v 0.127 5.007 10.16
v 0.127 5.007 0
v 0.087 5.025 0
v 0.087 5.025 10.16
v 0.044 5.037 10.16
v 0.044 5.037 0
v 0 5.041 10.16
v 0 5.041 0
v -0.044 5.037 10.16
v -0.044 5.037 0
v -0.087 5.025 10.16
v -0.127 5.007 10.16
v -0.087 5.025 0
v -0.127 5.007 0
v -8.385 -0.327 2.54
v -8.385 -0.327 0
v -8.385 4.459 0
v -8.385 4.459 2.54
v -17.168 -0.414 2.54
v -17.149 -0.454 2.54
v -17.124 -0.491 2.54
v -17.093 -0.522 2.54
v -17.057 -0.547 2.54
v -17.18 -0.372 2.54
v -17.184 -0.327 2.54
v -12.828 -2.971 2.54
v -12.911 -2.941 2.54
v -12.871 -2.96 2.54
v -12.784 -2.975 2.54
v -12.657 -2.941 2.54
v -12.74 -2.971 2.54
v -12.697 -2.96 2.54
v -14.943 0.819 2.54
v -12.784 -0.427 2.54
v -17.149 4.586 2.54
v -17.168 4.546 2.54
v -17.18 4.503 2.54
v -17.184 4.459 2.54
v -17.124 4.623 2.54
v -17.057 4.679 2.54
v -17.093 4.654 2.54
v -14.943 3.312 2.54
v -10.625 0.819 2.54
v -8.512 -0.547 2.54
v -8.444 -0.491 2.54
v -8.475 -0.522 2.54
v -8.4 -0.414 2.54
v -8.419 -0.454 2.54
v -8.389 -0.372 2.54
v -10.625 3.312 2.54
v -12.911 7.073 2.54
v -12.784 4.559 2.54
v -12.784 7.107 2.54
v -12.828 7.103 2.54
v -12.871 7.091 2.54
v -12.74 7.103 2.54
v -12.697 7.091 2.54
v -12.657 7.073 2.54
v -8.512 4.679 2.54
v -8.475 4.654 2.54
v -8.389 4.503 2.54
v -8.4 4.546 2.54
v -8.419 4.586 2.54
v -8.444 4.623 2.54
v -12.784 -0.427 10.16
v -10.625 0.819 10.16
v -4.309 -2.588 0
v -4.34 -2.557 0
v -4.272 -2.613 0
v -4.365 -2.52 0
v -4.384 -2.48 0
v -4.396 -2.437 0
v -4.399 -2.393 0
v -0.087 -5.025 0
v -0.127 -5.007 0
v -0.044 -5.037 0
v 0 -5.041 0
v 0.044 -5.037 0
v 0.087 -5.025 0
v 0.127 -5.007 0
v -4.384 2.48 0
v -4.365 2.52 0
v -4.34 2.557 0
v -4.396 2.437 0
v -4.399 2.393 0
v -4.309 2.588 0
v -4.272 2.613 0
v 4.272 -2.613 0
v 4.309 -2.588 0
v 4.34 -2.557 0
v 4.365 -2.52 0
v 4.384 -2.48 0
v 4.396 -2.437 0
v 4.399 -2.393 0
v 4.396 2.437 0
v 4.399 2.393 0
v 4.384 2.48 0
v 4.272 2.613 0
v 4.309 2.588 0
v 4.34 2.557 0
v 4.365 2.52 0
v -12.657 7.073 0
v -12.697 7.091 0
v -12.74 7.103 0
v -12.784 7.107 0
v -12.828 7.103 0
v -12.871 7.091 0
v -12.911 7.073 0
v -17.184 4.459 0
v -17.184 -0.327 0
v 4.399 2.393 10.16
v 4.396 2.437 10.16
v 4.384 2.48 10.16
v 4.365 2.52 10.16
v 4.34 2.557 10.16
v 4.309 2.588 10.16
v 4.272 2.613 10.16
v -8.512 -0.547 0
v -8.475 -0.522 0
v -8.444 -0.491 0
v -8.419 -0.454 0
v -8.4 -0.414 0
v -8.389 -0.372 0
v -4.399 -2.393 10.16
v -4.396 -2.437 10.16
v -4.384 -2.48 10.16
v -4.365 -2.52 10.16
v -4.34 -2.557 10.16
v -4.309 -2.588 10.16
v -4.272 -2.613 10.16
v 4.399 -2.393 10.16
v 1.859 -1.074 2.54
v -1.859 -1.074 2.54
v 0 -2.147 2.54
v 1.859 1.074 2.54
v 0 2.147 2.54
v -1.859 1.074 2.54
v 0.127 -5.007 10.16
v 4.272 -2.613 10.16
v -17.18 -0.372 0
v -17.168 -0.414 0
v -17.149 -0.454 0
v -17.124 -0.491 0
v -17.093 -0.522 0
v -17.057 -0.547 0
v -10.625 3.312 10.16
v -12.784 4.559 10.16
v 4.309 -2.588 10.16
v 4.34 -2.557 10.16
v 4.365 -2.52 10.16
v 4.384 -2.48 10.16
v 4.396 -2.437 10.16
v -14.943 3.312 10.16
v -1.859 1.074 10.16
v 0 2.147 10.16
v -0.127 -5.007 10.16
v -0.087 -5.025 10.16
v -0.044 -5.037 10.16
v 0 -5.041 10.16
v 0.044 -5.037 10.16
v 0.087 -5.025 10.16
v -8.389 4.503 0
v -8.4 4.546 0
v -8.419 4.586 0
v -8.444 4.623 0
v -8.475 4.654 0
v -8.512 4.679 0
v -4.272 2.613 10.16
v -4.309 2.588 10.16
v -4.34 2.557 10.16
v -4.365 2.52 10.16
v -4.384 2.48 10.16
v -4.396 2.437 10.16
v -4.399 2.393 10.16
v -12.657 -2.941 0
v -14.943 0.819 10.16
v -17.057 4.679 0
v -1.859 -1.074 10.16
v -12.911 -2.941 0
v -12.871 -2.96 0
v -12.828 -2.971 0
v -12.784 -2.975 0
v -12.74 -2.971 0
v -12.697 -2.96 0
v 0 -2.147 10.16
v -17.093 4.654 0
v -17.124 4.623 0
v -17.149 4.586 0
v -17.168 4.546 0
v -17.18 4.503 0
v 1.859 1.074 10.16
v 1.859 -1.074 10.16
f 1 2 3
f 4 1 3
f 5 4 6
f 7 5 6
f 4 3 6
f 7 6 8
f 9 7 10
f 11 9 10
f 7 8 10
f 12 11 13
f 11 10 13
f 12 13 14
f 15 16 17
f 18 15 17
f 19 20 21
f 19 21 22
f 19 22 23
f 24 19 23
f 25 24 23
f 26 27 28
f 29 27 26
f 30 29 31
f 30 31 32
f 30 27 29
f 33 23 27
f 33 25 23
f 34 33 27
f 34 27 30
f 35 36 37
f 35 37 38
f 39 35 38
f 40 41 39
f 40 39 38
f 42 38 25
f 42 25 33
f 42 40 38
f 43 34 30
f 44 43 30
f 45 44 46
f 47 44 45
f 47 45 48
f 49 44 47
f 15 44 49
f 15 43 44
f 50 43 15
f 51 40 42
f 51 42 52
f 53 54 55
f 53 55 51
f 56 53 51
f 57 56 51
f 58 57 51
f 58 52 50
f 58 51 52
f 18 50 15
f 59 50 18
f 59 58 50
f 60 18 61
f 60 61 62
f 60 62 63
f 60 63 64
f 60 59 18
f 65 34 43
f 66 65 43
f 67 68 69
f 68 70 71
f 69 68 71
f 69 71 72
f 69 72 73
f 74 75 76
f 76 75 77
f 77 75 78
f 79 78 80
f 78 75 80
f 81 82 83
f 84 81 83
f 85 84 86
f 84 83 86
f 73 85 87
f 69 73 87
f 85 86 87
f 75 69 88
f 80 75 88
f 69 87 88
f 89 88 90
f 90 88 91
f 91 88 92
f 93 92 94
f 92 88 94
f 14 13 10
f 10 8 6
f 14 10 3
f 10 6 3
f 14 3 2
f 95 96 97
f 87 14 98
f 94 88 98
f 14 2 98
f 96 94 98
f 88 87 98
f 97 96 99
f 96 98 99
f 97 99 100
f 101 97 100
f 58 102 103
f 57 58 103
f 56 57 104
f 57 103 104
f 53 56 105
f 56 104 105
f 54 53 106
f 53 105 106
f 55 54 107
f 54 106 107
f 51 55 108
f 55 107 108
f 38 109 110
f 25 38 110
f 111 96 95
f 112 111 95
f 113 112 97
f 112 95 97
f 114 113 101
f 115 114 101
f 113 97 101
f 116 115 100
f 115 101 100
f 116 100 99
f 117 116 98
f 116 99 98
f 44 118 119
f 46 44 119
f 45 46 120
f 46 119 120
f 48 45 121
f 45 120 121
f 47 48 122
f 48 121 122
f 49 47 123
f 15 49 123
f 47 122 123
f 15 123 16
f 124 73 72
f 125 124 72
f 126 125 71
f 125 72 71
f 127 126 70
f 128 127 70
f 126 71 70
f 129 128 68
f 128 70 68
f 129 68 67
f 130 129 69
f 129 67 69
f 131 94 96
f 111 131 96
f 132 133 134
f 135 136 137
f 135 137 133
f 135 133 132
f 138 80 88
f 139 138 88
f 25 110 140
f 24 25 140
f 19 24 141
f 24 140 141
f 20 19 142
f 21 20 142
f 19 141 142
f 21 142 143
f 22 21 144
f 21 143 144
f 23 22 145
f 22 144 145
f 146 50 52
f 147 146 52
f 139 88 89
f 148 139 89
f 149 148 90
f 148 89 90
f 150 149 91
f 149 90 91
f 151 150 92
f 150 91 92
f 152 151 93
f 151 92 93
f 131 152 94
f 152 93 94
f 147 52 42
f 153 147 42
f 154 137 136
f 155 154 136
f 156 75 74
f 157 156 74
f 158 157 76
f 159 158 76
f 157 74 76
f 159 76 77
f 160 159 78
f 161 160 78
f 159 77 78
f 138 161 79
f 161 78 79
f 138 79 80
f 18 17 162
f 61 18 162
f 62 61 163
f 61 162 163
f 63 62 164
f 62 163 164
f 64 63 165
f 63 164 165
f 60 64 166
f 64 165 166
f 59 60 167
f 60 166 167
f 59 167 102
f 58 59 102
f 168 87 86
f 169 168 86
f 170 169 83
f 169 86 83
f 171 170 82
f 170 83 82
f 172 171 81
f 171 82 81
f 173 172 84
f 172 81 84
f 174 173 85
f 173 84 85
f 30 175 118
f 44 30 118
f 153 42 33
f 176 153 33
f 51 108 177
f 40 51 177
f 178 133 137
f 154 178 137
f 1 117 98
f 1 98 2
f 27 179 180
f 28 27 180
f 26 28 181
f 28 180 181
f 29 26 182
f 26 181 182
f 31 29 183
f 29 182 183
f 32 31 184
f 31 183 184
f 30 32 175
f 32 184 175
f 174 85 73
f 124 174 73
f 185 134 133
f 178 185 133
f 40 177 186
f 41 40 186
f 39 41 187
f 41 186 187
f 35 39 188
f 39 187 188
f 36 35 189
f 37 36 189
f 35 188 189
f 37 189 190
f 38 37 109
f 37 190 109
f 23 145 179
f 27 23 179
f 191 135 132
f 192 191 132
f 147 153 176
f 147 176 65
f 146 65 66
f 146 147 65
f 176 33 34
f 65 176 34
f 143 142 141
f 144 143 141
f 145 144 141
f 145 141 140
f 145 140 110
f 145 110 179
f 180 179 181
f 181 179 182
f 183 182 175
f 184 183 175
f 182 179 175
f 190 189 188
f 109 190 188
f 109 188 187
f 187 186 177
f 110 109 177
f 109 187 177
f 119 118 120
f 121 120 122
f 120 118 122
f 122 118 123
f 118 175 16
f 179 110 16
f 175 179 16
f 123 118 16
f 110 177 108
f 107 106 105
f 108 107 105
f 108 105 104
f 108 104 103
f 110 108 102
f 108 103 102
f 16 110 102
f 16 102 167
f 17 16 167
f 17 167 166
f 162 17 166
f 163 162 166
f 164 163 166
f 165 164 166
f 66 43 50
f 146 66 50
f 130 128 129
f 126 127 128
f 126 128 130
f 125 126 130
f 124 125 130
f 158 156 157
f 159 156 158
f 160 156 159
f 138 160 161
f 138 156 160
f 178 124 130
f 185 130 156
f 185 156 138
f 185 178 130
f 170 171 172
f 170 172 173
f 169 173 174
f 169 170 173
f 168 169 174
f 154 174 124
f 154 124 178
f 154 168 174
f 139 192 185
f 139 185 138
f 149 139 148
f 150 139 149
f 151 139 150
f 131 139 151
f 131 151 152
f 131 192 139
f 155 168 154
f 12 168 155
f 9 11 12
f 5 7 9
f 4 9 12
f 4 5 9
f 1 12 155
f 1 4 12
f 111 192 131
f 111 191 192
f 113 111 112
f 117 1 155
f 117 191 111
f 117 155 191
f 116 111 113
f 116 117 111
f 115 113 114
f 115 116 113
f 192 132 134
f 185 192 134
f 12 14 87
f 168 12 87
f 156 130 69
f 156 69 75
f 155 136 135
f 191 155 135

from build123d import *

# Parameters (mm, degrees)
F1_DEPTH = 10.16
F2_DEPTH = 2.54
F3_DEPTH = 10.16
F4_DEPTH = 2.54


with BuildPart() as f1:
    # F0 (on Top) → F1 (new body)
    with BuildSketch(Plane.XY):
        Polygon((-10.625117, 0.819381), (-10.625117, 3.31238), (-12.784117, 4.558879), (-14.943117, 3.31238), (-14.943117, 0.819381), (-12.784117, -0.427118), align=None)
    extrude(amount=F1_DEPTH)

    # F0 (on Top) → F2 (join)
    with BuildSketch(Plane.XY):
        with BuildLine():
            Line((-12.911117, 7.072557), (-17.056526, 4.679204))
            ThreePointArc((-17.056526, 4.679204), (-17.149497, 4.586234), (-17.183526, 4.459234))
            Line((-17.183526, 4.459234), (-17.183526, -0.327472))
            ThreePointArc((-17.183526, -0.327472), (-17.149497, -0.454472), (-17.056526, -0.547443))
            Line((-17.056526, -0.547443), (-12.911117, -2.940796))
            ThreePointArc((-12.911117, -2.940796), (-12.784117, -2.974825), (-12.657117, -2.940796))
            Line((-12.657117, -2.940796), (-8.511708, -0.547443))
            ThreePointArc((-8.511708, -0.547443), (-8.418738, -0.454472), (-8.384708, -0.327472))
            Line((-8.384708, -0.327472), (-8.384708, 4.459234))
            ThreePointArc((-8.384708, 4.459234), (-8.418738, 4.586234), (-8.511708, 4.679204))
            Line((-8.511708, 4.679204), (-12.657117, 7.072557))
            ThreePointArc((-12.657117, 7.072557), (-12.784117, 7.106587), (-12.911117, 7.072557))
        make_face()
        Polygon((-12.784117, 4.558879), (-10.625117, 3.31238), (-10.625117, 0.819381), (-12.784117, -0.427118), (-14.943117, 0.819381), (-14.943117, 3.31238), align=None, mode=Mode.SUBTRACT)
    extrude(amount=F2_DEPTH)


with BuildPart() as f3:
    # F0 (on Top) → F3 (new body)
    with BuildSketch(Plane.XY):
        with BuildLine():
            Line((-0.127, 5.006677), (-4.272409, 2.613323))
            ThreePointArc((-4.272409, 2.613323), (-4.36538, 2.520353), (-4.399409, 2.393353))
            Line((-4.399409, 2.393353), (-4.399409, -2.393353))
            ThreePointArc((-4.399409, -2.393353), (-4.36538, -2.520353), (-4.272409, -2.613323))
            Line((-4.272409, -2.613323), (-0.127, -5.006677))
            ThreePointArc((-0.127, -5.006677), (0, -5.040706), (0.127, -5.006677))
            Line((0.127, -5.006677), (4.272409, -2.613323))
            ThreePointArc((4.272409, -2.613323), (4.36538, -2.520353), (4.399409, -2.393353))
            Line((4.399409, -2.393353), (4.399409, 2.393353))
            ThreePointArc((4.399409, 2.393353), (4.36538, 2.520353), (4.272409, 2.613323))
            Line((4.272409, 2.613323), (0.127, 5.006677))
            ThreePointArc((0.127, 5.006677), (0, 5.040706), (-0.127, 5.006677))
        make_face()
        Polygon((0, 2.147061), (1.859409, 1.07353), (1.859409, -1.07353), (0, -2.147061), (-1.859409, -1.07353), (-1.859409, 1.07353), align=None, mode=Mode.SUBTRACT)
    extrude(amount=F3_DEPTH)

    # F0 (on Top) → F4 (join)
    with BuildSketch(Plane.XY):
        Polygon((1.859409, -1.07353), (1.859409, 1.07353), (0, 2.147061), (-1.859409, 1.07353), (-1.859409, -1.07353), (0, -2.147061), align=None)
    extrude(amount=F4_DEPTH)


solid = Compound([f1.part, f3.part])
